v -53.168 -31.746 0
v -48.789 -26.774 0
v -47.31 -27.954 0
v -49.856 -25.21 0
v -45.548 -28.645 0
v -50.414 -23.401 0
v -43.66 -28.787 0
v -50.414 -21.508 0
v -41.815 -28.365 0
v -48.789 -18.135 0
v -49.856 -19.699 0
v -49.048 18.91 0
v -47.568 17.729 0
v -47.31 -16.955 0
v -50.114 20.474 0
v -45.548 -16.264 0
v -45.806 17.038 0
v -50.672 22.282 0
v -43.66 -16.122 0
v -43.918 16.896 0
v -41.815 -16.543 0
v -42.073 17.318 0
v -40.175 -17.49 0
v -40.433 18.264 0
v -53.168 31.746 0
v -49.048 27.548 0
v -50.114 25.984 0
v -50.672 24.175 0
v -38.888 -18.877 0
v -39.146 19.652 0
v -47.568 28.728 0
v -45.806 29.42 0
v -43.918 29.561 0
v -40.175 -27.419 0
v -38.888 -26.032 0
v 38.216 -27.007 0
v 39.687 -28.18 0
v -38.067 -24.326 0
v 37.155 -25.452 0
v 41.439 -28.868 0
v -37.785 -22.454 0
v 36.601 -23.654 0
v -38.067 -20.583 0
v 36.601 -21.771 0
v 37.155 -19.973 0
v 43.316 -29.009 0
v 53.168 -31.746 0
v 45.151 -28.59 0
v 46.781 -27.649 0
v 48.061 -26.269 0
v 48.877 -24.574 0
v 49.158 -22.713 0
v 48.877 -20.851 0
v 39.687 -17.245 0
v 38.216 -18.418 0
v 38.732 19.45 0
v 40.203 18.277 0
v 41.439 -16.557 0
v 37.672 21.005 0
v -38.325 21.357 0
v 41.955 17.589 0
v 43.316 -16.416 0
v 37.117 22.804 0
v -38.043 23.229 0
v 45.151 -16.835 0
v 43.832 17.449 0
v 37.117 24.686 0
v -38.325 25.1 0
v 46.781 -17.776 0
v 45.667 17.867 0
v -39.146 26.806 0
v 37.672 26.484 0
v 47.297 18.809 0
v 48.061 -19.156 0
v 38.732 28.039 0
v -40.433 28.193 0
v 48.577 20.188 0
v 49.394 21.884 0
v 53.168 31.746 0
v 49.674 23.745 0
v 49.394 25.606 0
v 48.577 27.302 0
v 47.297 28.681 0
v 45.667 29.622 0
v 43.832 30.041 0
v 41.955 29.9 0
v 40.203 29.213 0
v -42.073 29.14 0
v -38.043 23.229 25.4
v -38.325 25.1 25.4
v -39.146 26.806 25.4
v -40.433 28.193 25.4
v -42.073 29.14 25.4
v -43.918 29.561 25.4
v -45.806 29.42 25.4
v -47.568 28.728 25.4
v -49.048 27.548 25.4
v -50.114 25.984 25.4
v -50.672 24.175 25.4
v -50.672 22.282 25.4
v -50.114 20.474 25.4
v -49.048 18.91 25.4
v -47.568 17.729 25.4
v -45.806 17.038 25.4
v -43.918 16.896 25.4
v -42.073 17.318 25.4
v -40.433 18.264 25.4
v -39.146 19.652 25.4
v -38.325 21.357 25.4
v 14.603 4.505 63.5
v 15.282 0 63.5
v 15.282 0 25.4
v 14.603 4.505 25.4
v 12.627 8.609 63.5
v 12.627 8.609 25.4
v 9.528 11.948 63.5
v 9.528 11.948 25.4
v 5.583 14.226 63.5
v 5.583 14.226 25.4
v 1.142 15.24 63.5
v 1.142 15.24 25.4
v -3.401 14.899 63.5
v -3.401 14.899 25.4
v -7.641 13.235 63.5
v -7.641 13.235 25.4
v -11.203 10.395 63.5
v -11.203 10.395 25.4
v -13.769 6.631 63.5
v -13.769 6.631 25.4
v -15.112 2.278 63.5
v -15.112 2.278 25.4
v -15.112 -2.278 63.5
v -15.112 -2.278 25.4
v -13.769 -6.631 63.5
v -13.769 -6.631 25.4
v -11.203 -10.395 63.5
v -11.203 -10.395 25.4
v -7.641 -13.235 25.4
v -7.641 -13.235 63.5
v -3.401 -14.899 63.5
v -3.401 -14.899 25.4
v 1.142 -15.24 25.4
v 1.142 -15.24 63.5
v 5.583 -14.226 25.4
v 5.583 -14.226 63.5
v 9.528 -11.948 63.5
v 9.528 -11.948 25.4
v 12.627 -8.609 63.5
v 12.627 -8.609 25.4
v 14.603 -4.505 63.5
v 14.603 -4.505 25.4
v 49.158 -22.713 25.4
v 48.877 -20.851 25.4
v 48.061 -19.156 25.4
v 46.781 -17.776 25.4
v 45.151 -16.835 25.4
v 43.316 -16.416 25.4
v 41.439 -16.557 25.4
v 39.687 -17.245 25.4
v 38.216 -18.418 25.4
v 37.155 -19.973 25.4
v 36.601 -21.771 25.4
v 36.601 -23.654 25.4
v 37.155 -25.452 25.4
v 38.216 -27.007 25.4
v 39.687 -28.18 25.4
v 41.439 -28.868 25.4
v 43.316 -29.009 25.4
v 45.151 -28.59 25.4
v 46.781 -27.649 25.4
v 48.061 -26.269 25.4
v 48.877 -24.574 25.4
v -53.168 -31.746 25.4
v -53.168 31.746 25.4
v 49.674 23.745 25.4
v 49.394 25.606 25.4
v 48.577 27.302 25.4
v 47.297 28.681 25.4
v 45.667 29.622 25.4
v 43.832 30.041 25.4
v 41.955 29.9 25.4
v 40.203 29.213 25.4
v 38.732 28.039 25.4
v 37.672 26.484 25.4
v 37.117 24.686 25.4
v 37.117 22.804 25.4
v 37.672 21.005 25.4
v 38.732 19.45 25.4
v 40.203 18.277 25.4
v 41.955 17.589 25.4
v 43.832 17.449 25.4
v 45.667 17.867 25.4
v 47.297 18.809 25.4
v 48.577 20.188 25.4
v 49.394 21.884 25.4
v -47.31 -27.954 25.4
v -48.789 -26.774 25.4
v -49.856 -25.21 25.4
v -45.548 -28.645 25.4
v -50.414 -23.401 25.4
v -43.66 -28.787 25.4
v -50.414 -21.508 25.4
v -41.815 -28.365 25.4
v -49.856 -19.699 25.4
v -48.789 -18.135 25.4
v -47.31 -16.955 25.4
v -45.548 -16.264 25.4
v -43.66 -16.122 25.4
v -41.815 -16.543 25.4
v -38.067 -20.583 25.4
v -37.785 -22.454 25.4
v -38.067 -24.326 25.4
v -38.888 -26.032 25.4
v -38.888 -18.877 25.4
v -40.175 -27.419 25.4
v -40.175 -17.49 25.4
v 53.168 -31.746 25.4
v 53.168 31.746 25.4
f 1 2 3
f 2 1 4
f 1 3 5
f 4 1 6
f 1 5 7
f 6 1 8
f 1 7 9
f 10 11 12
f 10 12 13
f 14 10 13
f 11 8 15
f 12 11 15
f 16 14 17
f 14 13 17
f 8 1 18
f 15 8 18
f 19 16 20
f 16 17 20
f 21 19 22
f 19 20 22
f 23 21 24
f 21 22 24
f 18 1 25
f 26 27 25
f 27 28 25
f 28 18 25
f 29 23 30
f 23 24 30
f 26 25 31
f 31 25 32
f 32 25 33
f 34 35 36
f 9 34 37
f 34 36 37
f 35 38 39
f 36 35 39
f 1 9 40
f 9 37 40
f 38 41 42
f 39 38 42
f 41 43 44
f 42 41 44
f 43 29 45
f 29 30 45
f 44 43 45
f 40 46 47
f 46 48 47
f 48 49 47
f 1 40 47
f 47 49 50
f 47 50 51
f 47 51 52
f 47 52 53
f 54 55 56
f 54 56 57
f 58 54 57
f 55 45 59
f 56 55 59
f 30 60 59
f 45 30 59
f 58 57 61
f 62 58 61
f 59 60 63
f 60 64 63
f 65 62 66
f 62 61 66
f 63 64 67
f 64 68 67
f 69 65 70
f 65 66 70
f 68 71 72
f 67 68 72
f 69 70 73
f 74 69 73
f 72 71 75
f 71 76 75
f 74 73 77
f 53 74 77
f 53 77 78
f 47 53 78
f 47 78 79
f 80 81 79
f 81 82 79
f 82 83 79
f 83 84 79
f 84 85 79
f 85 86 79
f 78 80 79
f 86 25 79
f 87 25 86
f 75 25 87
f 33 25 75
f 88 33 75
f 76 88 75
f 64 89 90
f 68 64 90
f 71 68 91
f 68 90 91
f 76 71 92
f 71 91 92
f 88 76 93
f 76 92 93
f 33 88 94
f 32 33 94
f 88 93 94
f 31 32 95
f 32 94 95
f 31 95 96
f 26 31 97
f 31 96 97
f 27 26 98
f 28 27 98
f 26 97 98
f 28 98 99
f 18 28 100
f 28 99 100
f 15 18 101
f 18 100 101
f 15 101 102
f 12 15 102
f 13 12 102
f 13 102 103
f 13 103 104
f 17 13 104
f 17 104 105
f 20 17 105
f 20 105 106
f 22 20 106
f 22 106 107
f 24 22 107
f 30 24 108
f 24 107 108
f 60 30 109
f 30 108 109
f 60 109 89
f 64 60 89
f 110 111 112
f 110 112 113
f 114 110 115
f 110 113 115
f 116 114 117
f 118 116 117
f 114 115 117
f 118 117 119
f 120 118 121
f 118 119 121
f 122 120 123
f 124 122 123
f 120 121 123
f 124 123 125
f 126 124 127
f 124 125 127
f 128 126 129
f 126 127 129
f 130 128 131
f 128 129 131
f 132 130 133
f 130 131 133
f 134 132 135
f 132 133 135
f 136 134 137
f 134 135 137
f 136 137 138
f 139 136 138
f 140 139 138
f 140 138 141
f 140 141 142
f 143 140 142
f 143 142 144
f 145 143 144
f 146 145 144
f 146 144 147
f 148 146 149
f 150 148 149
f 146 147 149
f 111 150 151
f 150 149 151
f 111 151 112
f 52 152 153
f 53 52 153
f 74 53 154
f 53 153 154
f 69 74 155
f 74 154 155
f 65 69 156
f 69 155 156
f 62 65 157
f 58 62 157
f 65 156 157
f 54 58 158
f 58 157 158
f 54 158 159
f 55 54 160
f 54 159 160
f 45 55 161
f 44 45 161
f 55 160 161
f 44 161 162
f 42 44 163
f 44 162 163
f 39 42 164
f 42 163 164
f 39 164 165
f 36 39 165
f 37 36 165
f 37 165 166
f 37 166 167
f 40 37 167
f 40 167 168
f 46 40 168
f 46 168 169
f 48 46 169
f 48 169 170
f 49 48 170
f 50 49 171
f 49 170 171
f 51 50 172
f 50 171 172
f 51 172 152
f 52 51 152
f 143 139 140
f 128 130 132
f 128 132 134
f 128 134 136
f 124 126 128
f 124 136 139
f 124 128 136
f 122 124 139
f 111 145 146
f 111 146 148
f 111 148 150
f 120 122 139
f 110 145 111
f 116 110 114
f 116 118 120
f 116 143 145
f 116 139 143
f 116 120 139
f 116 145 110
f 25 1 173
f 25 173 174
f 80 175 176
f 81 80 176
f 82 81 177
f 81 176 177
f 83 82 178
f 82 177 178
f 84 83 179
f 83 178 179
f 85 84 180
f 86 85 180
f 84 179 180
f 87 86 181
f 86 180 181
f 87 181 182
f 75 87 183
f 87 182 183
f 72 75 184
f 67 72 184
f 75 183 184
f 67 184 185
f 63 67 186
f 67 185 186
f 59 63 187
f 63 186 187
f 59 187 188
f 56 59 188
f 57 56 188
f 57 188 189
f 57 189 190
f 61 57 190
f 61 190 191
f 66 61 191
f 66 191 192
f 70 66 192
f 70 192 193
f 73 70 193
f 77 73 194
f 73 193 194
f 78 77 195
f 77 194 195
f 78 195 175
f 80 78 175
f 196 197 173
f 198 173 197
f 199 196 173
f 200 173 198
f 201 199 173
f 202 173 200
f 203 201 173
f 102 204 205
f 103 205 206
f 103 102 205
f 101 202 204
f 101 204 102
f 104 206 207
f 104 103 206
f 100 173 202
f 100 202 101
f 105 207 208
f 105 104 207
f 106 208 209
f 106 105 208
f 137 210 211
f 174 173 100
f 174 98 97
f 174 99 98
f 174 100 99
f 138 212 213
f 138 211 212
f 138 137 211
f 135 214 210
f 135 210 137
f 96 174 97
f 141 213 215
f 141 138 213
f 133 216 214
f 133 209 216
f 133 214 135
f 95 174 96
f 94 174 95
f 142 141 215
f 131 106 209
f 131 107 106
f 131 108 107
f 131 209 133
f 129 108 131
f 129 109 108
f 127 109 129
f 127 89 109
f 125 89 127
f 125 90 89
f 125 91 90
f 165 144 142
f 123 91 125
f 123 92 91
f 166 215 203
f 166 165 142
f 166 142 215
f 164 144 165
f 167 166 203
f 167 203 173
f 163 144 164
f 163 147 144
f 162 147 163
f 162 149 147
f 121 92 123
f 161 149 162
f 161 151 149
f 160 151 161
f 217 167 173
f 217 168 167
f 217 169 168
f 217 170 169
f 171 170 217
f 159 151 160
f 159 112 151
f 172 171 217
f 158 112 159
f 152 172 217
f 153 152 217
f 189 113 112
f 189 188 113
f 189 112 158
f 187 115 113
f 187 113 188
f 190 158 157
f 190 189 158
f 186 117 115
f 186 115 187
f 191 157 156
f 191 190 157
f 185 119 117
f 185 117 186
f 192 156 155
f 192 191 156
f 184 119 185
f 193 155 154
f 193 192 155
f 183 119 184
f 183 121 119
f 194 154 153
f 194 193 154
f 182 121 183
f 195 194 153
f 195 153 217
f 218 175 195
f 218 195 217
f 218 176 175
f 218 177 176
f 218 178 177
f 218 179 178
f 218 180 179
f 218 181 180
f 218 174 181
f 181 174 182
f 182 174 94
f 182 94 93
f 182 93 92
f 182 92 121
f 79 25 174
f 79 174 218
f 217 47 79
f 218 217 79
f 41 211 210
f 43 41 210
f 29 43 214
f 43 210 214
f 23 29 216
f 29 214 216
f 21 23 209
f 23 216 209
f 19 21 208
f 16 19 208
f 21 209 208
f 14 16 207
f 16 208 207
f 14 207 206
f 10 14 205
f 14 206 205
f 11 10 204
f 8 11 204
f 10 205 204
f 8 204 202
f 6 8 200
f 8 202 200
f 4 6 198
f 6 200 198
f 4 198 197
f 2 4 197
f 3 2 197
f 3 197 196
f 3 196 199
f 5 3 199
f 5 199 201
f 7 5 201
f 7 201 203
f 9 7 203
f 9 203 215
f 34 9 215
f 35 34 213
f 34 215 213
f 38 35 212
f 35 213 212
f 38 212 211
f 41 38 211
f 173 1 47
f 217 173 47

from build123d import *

# Parameters (mm, degrees)
F0_W     = 106.33587
F0_H     = 63.491806
F1_DEPTH = 25.4
F2_R     = 6.35
F2_R_2   = 6.349997
F2_R_3   = 6.313875
F3_DEPTH = 25.4
F4_R     = 15.282294
F5_DEPTH = 38.1


with BuildPart() as f1:
    # F0 (on Top) → F1 (new body)
    with BuildSketch(Plane.XY):
        Rectangle(F0_W, F0_H)
    extrude(amount=F1_DEPTH)

    # F2 (on face) → F3 (cut)
    with BuildSketch(Plane.XY.offset(25.4)):
        with Locations((-44.392645, 23.228709)):
            Circle(F2_R)
        with Locations((-44.13455, -22.45442)):
            Circle(F2_R_2)
        with Locations((43.360256, 23.744902)):
            Circle(F2_R_3)
        with Locations((42.844065, -22.712516)):
            Circle(F2_R_3)
    extrude(amount=-F3_DEPTH, mode=Mode.SUBTRACT)

    # F4 (on face) → F5 (join)
    with BuildSketch(Plane.XY.offset(25.4)):
        Circle(F4_R)
    extrude(amount=F5_DEPTH)


solid = f1.part
